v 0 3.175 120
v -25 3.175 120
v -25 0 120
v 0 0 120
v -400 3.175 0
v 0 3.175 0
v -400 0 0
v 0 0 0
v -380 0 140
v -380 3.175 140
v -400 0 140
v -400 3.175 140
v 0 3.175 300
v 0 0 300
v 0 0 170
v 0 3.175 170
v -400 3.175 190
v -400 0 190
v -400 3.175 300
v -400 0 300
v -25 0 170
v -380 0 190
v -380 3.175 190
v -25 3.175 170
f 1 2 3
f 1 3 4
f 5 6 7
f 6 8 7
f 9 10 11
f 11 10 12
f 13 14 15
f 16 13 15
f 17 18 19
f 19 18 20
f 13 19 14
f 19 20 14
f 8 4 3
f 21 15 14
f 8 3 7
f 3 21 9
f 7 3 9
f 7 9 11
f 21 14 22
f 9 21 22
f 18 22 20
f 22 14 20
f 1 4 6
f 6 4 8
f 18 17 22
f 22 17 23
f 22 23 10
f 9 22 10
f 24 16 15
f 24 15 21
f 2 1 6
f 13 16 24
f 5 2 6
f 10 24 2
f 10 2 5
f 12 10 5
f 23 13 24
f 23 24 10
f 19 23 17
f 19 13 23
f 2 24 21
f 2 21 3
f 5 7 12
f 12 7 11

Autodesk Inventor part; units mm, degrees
ref_plane "YZ Plane" through (0, 0, 0) normal (1, 0, 0) x (0, 1, 0)
ref_plane "XZ Plane" through (0, 0, 0) normal (0, 1, 0) x (-1, 0, 0)
ref_plane "XY Plane" through (0, 0, 0) normal (0, 0, 1) x (1, 0, 0)
sketch "Sketch1" plane through (0, 0, 0) normal (0, 1, 0) x (-1, 0, 0)
  line L0 (0, 0) -> (400, 0)
  line L1 (400, 0) -> (400, 300)
  line L2 (400, 300) -> (0, 300)
  line L3 (0, 300) -> (0, 0)
  dimension "d0" = 300
  dimension "d1" = 400
extrude "Extrusion1" add sketch "Sketch1" along normal blind 3.175
sketch "Sketch2" plane through (0, 3.175, 0) normal (0, 1, 0) x (1, 0, 0)
  line L0 (0, -300) -> (0, 0) projected
  line L1 (0, -170) -> (-25, -170)
  line L2 (-25, -170) -> (-25, -120)
  line L3 (-25, -120) -> (0, -120)
  line L4 (0, -120) -> (0, -170)
  line L5 (-400, 0) -> (-400, -300) projected
  line L6 (-400, -190) -> (-380, -190)
  line L7 (-380, -190) -> (-380, -140)
  line L8 (-380, -140) -> (-400, -140)
  line L9 (-400, -140) -> (-400, -190)
  line L10 (-400, -300) -> (0, -300) projected
  point P0 (0, -120)
  dimension "d4" = 25
  dimension "d5" = 130
  dimension "d6" = 180
  dimension "d7" = 20
  dimension "d8" = 110
  dimension "d9" = 160
extrude "Extrusion2" cut sketch "Sketch2" against normal through all
properties part number "Stock Aluminum Sheet"
